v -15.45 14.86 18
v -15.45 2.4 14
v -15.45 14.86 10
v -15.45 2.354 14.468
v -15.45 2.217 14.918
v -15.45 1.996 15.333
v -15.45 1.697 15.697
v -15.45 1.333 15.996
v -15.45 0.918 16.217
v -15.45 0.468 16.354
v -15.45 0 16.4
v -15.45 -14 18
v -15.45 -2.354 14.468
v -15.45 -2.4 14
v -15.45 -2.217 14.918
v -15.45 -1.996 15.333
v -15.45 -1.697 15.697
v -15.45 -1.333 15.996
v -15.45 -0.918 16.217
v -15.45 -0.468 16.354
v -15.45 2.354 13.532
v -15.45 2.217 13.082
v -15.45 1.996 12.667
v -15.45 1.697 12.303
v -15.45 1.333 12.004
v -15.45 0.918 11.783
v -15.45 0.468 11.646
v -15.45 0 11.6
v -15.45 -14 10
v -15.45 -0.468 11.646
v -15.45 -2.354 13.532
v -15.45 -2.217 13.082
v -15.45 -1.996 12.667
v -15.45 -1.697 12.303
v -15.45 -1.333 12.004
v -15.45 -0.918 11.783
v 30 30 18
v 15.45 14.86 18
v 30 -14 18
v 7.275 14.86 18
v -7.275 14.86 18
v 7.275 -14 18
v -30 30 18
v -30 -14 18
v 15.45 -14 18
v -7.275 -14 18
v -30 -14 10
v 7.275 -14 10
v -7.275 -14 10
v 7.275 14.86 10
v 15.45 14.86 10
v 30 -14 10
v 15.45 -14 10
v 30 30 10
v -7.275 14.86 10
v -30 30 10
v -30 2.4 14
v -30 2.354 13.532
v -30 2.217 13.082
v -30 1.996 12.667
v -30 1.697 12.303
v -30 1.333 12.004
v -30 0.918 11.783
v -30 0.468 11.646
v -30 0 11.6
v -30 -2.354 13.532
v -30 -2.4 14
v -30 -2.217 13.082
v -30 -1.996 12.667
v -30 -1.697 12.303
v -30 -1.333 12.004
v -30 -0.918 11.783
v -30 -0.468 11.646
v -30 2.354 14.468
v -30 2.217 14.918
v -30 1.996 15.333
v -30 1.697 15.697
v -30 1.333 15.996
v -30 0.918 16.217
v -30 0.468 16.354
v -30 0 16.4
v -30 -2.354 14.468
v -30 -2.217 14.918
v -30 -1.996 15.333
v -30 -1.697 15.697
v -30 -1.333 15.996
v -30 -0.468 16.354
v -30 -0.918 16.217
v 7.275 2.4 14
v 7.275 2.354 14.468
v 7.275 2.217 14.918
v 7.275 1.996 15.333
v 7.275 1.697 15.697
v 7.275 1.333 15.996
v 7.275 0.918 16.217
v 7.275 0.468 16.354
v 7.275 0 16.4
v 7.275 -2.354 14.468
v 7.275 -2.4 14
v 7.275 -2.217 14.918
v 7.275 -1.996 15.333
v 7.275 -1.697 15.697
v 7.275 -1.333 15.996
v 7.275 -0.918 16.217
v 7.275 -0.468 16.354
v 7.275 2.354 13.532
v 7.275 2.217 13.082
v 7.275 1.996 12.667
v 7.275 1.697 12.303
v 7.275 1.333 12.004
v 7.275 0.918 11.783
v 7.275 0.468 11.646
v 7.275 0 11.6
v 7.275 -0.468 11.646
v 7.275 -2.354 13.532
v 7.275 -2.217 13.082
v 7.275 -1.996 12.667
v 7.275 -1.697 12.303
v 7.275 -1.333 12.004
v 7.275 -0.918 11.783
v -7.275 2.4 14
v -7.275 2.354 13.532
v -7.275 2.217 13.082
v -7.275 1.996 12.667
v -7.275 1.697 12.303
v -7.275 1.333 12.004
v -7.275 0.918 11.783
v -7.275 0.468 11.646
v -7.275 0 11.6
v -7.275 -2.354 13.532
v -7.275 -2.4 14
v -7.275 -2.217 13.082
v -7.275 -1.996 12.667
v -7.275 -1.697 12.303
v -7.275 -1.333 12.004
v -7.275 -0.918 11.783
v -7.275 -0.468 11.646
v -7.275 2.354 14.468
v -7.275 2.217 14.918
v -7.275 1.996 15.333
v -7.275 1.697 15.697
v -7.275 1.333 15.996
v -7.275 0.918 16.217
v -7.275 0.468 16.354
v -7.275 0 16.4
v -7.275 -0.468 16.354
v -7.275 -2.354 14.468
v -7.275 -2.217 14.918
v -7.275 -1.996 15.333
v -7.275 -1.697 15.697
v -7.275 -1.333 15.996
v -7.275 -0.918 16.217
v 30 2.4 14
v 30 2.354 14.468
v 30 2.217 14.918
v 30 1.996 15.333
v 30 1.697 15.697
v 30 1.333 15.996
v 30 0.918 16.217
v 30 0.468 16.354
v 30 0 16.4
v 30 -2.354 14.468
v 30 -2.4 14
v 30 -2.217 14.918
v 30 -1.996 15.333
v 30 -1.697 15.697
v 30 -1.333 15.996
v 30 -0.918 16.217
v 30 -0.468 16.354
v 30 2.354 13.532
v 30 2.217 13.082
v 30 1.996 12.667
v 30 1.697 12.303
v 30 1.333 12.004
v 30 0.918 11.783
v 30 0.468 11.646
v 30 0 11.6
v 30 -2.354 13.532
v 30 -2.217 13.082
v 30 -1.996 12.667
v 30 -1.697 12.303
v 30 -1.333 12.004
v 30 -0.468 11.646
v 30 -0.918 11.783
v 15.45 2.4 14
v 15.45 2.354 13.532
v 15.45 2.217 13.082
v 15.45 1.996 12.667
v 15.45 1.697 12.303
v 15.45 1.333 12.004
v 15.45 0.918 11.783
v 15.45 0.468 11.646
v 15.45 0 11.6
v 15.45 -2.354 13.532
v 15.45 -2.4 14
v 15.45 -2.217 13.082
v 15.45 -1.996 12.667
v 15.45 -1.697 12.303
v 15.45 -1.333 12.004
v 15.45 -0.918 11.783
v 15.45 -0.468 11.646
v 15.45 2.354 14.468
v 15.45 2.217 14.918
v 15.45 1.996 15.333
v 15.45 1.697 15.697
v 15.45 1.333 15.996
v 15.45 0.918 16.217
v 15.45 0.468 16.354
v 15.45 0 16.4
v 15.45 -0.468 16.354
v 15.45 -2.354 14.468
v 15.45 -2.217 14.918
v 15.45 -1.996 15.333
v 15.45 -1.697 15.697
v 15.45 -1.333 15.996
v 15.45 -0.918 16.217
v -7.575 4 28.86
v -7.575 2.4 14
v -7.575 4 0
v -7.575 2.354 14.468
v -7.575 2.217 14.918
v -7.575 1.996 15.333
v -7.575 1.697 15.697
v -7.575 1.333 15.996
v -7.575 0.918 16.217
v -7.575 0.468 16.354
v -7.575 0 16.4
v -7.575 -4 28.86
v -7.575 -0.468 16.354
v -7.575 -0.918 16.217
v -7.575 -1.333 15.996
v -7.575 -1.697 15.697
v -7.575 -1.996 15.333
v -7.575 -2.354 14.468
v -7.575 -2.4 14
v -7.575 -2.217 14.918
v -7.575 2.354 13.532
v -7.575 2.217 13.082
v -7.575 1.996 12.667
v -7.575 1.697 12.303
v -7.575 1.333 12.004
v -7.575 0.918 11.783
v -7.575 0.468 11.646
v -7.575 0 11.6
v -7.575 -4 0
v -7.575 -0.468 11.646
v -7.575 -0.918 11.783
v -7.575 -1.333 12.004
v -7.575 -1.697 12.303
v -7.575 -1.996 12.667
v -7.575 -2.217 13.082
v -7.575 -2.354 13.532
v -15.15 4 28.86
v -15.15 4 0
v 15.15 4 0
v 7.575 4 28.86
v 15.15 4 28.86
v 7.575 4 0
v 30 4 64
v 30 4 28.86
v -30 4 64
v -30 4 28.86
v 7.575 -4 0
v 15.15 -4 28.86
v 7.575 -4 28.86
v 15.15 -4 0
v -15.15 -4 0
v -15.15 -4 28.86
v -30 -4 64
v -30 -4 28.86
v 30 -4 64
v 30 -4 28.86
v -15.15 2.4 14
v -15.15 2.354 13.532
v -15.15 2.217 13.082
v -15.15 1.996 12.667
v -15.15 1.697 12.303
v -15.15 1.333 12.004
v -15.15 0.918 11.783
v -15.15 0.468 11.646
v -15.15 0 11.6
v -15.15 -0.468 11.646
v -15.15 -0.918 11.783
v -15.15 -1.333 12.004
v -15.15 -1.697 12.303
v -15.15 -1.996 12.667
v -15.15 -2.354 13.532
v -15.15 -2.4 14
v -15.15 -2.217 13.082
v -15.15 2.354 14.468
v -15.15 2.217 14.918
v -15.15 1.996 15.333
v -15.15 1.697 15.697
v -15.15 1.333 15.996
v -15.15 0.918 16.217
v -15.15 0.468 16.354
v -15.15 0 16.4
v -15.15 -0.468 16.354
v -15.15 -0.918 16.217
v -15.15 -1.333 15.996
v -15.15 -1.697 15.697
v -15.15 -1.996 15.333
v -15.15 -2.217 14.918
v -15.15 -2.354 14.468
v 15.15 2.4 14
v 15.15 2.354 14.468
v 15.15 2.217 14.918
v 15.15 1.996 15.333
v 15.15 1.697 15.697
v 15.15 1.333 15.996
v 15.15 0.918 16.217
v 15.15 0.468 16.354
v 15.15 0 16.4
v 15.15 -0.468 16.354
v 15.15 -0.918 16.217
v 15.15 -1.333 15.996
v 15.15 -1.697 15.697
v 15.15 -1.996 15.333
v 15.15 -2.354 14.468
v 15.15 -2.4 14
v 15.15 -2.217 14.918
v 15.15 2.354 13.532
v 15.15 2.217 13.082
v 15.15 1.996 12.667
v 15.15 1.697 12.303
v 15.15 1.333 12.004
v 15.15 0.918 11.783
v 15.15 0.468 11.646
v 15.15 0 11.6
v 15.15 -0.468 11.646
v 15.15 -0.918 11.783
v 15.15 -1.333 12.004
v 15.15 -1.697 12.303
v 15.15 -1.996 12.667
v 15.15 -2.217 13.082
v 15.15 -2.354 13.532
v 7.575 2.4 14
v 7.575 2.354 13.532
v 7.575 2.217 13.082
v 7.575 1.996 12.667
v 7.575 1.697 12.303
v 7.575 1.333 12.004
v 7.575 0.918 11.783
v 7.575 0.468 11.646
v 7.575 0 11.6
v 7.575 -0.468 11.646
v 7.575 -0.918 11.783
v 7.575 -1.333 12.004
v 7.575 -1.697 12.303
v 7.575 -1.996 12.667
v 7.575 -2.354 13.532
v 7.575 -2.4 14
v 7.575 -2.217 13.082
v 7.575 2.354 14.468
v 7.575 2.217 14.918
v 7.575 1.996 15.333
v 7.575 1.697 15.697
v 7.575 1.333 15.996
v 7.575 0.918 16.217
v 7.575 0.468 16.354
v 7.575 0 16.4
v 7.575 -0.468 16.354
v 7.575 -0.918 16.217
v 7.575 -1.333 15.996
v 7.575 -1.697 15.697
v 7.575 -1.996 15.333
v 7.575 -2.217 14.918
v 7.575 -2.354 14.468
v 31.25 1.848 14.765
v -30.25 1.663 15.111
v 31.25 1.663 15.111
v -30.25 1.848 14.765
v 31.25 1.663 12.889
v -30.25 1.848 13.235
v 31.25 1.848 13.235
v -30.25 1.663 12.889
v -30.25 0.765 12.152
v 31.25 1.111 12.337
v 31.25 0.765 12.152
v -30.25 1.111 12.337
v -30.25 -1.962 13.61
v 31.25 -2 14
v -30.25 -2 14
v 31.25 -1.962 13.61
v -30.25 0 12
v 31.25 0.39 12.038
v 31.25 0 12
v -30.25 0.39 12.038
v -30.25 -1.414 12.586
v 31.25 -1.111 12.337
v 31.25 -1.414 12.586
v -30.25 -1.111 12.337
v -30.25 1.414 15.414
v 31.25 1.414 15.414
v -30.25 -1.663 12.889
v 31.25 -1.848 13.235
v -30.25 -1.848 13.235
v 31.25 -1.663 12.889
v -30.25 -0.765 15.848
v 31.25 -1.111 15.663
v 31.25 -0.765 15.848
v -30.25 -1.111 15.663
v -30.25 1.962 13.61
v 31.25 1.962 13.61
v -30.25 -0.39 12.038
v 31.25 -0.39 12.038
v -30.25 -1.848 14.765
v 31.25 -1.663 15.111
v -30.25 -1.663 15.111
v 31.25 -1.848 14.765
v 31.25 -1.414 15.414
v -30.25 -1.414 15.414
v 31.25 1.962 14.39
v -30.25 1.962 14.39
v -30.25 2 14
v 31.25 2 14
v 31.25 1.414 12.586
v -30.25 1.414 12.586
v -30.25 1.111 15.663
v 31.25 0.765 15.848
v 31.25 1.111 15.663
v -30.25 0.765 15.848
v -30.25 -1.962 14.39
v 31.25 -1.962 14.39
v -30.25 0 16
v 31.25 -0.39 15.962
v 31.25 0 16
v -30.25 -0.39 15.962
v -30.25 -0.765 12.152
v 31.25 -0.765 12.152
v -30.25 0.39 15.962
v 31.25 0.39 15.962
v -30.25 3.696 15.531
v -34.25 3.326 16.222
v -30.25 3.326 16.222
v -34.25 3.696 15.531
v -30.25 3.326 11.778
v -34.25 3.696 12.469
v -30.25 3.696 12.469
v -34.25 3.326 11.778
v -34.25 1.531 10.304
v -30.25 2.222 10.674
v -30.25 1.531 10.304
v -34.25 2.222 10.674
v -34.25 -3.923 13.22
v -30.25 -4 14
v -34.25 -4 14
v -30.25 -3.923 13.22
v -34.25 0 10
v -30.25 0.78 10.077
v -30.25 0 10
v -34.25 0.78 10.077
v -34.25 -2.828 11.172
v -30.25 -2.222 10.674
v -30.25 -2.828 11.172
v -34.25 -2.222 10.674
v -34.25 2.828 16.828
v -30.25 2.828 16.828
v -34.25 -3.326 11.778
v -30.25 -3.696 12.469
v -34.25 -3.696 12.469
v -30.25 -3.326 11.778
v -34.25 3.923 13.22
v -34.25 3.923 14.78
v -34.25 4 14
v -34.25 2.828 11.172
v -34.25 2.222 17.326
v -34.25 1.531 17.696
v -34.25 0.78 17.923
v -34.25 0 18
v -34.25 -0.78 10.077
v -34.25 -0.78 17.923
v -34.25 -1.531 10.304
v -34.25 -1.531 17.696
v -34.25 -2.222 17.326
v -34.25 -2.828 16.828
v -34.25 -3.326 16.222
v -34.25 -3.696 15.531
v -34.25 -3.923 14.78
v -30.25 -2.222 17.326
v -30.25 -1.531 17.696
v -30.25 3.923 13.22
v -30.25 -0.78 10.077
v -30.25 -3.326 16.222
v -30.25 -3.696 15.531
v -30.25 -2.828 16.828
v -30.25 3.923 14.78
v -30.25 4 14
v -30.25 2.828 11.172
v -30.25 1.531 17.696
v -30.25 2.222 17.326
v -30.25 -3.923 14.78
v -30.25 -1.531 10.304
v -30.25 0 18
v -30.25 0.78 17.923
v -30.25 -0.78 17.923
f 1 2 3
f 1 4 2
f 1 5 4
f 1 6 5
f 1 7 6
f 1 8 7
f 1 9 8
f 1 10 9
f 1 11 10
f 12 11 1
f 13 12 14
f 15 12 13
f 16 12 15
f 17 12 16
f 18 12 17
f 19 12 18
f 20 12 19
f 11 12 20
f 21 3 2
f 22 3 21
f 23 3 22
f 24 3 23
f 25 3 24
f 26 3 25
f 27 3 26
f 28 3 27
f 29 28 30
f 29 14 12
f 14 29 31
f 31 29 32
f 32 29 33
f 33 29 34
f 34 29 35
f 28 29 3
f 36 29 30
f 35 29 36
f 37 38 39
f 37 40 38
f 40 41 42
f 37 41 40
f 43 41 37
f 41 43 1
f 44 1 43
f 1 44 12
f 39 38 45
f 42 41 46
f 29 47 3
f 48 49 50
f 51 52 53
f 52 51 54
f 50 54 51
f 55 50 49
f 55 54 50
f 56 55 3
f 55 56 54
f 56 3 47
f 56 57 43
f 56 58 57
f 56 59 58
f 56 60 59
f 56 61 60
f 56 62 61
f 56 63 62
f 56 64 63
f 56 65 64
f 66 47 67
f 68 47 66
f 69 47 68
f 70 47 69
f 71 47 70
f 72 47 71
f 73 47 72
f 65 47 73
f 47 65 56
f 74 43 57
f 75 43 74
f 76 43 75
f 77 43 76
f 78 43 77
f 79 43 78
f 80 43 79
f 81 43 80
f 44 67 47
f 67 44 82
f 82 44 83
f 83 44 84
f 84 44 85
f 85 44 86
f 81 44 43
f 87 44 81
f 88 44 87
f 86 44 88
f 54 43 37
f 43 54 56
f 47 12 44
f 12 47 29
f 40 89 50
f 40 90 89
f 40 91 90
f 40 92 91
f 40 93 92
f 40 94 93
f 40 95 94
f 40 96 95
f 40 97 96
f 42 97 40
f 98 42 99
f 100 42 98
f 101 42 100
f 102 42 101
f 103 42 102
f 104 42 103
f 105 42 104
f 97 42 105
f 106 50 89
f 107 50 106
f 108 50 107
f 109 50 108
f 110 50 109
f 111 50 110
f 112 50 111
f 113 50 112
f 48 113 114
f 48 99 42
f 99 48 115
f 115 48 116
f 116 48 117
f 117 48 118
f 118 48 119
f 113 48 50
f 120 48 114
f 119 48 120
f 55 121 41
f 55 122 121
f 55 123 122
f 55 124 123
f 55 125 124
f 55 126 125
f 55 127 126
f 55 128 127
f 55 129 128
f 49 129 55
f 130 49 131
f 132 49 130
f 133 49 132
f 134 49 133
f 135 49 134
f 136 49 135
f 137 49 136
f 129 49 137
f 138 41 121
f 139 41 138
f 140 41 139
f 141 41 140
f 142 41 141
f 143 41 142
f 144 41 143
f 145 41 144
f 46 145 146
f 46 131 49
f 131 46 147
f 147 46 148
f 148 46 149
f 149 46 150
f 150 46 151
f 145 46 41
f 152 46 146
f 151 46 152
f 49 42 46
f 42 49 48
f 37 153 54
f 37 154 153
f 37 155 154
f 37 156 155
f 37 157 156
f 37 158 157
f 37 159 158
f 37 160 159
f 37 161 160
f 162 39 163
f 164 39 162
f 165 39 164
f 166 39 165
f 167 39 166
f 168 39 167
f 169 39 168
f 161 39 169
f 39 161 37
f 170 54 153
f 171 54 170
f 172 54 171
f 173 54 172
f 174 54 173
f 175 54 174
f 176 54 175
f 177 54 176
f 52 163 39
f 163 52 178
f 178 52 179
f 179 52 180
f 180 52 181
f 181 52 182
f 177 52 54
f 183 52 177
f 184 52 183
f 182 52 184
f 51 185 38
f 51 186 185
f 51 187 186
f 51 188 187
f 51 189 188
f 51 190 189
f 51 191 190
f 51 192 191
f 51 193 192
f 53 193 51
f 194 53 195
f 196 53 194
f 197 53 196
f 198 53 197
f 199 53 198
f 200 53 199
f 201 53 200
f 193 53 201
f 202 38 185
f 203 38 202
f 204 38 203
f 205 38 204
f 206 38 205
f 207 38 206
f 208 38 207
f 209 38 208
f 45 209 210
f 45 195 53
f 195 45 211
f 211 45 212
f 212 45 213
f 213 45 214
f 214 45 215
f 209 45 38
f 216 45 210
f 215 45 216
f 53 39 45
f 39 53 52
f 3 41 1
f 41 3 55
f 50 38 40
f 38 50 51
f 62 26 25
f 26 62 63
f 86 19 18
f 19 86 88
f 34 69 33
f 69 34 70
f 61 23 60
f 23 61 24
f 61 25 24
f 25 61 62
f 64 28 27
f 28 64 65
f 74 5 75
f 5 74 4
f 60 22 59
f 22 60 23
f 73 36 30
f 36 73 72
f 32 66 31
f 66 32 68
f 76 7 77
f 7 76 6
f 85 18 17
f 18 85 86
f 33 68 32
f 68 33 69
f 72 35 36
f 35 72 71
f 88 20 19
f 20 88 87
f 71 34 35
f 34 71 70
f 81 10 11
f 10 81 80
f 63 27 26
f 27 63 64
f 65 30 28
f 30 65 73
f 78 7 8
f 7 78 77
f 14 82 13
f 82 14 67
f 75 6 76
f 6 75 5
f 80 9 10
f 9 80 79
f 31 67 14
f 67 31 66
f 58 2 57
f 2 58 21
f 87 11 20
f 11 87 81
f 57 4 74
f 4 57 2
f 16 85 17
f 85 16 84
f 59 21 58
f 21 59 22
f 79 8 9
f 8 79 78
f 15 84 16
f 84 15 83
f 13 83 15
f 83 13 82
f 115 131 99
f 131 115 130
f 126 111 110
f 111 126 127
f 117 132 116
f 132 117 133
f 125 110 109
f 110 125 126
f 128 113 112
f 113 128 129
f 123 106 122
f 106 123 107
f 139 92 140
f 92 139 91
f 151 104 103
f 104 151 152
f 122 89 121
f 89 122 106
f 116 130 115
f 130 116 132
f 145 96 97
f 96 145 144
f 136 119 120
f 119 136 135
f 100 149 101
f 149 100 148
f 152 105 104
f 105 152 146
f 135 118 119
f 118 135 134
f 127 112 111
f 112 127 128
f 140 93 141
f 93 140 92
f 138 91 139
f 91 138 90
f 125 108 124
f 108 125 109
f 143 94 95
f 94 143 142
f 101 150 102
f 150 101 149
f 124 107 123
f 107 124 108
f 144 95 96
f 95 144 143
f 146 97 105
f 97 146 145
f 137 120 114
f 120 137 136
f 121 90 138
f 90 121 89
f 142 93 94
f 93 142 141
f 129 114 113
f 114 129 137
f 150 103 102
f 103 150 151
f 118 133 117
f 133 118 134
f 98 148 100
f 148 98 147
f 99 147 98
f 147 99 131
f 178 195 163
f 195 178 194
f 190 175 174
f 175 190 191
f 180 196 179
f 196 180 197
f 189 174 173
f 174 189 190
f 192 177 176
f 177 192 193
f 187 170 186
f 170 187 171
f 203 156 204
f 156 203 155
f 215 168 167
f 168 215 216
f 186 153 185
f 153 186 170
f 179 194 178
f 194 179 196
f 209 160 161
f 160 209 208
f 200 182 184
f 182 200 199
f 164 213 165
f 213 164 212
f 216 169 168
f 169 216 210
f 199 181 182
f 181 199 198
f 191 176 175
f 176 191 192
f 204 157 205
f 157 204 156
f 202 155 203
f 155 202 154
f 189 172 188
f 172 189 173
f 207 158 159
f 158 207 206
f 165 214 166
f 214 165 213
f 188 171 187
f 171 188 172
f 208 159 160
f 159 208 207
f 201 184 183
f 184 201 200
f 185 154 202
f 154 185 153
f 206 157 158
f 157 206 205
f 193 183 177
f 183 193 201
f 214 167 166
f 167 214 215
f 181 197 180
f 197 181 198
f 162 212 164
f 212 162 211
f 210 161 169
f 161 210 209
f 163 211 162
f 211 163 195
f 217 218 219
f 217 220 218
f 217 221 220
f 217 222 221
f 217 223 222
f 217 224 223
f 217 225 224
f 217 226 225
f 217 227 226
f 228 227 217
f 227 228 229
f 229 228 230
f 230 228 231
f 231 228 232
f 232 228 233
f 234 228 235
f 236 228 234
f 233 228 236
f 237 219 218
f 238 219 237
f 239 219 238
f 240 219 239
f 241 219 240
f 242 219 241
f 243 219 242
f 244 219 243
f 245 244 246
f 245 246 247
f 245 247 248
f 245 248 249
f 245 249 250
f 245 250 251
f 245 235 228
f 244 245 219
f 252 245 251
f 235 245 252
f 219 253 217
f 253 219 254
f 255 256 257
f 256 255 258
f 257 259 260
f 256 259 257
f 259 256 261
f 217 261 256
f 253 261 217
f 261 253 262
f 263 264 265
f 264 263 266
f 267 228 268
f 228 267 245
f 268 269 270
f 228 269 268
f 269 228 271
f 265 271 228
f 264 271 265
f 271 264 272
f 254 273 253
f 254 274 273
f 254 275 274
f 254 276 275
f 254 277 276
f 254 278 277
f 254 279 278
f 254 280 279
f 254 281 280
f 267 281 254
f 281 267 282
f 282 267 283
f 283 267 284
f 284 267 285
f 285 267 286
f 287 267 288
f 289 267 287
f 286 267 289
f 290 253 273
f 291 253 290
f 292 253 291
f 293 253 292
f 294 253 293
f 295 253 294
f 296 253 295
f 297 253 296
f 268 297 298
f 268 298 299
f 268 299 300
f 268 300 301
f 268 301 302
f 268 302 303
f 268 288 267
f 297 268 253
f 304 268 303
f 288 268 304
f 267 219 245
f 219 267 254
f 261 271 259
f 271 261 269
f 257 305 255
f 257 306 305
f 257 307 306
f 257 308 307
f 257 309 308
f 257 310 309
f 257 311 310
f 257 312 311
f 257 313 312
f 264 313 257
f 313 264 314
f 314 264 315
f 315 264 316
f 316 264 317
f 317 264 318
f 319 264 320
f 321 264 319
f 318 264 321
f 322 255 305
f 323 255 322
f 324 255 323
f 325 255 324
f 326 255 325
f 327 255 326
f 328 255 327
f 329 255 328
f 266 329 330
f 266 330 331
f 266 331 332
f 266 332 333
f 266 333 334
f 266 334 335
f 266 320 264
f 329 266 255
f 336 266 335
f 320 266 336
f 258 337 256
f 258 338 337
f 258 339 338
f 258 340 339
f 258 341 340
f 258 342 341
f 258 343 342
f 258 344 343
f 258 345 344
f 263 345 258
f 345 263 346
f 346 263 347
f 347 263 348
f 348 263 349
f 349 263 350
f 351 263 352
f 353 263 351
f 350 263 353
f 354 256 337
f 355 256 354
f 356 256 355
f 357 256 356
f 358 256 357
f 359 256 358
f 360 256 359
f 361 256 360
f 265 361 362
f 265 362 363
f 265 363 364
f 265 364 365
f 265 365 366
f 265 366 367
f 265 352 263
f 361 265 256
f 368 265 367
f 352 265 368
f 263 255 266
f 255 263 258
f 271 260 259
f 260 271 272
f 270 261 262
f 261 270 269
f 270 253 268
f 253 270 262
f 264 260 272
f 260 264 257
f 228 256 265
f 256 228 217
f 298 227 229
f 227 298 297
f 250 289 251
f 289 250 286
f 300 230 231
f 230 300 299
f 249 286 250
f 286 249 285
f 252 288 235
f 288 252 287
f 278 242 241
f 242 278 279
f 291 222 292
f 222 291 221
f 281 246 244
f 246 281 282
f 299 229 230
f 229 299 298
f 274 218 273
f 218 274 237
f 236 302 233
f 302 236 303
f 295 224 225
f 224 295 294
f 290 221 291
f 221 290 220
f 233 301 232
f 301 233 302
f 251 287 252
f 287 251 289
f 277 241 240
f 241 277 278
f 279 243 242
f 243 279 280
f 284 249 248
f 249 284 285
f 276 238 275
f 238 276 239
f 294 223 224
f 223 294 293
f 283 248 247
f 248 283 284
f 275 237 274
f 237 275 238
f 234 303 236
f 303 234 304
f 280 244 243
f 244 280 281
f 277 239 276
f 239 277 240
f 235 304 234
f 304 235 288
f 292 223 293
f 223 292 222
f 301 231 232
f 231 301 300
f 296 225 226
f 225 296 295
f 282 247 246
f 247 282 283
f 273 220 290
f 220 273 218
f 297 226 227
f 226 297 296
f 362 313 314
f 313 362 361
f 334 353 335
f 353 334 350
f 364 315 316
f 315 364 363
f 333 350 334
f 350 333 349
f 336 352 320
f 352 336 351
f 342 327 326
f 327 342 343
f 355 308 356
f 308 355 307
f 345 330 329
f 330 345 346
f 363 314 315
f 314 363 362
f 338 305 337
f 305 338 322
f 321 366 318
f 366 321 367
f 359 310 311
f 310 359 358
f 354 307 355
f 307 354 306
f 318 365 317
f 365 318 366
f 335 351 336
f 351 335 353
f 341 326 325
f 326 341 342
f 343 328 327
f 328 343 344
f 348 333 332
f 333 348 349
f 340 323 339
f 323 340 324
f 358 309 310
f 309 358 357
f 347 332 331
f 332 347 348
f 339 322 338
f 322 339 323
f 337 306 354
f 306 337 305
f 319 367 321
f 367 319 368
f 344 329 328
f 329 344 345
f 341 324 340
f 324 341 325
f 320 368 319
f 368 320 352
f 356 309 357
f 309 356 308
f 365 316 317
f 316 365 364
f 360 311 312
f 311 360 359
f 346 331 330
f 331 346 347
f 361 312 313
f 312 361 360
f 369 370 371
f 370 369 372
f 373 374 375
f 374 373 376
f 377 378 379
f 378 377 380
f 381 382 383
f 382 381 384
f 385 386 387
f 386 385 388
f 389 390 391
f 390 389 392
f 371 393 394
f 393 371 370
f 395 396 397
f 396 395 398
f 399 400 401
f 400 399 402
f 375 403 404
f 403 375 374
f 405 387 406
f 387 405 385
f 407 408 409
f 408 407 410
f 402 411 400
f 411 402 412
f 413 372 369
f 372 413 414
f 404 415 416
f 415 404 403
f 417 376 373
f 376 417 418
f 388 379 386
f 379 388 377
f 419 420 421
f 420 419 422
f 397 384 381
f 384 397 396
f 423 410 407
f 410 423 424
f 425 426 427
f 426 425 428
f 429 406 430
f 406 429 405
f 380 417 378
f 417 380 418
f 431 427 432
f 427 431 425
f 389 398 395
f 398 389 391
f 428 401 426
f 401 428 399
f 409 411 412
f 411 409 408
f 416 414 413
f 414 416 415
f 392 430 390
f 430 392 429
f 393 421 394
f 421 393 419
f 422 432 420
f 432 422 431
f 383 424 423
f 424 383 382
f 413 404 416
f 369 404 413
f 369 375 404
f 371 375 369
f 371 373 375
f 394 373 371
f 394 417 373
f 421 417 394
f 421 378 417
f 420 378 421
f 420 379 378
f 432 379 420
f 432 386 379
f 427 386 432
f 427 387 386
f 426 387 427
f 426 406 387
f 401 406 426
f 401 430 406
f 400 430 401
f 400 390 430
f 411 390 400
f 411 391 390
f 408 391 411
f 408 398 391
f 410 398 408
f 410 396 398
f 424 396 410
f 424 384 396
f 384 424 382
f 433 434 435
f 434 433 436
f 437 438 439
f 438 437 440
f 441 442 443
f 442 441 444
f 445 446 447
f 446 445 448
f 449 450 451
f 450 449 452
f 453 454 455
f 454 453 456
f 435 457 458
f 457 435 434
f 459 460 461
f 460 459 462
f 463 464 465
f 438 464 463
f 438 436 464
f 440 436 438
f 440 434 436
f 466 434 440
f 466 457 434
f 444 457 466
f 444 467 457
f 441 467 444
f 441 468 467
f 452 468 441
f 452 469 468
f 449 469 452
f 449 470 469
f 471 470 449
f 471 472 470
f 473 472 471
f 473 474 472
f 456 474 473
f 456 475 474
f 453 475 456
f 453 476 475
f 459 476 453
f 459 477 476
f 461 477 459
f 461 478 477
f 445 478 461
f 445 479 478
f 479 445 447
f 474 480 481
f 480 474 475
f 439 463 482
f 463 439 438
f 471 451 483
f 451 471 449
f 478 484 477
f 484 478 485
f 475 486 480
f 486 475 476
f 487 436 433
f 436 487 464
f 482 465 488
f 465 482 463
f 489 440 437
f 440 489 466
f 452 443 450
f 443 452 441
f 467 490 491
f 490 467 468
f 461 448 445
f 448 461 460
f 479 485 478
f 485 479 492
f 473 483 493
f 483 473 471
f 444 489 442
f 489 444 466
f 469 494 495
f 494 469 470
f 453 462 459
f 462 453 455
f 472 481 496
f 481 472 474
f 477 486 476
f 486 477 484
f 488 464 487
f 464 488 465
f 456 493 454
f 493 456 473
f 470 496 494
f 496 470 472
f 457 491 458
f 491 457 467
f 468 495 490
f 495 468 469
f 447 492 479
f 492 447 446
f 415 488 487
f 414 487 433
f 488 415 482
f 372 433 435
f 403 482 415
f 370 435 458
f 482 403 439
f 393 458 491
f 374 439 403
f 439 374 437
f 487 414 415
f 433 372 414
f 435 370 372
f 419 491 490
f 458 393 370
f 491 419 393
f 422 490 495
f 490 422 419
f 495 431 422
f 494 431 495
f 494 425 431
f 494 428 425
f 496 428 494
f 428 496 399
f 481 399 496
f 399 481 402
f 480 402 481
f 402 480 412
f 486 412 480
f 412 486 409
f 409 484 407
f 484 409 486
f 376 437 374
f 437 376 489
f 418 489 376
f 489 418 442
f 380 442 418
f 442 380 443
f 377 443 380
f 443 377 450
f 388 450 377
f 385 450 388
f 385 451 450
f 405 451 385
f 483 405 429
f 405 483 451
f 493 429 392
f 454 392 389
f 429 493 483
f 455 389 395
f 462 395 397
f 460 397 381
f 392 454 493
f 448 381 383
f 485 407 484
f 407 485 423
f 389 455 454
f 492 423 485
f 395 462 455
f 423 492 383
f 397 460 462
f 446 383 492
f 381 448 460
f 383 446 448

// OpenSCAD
$fn = 32;

// ------------------------------------------------------------------------
// Butt hinge: hinge 60 mm, leaf swung 270 deg
// Every part is its own module, assembly() places every instance.
// ------------------------------------------------------------------------

// --- part 1 ---
module hinge_base() {
  difference() {
    union() {
      translate([-30, -14, -4]) cube([14.55, 44, 8]);
      translate([-7.275, -14, -4]) cube([14.55, 44, 8]);
      translate([15.45, -14, -4]) cube([14.55, 44, 8]);
      translate([-30, 14.86, -4]) cube([60, 15.14, 8]);
    }
    translate([-22.725, 0, 0]) rotate([0, 90, 0]) cylinder(h = 16.55, d = 4.8, center = true);
    translate([0, 0, 0]) rotate([0, 90, 0]) cylinder(h = 16.55, d = 4.8, center = true);
    translate([22.725, 0, 0]) rotate([0, 90, 0]) cylinder(h = 16.55, d = 4.8, center = true);
  }
}

// --- part 2 ---
module hinge_mover() {
  difference() {
    union() {
      translate([-15.15, -50, -4]) cube([7.575, 64, 8]);
      translate([7.575, -50, -4]) cube([7.575, 64, 8]);
      translate([-30, -50, -4]) cube([60, 35.14, 8]);
    }
    translate([-11.362, 0, 0]) rotate([0, 90, 0]) cylinder(h = 9.575, d = 4.8, center = true);
    translate([11.362, 0, 0]) rotate([0, 90, 0]) cylinder(h = 9.575, d = 4.8, center = true);
  }
}

// --- part 3 ---
module hinge_pin() {
  rotate([0, 90, 0]) cylinder(h = 62.5, d = 4, center = true);
  translate([-34.25, 0, 0]) rotate([0, 90, 0]) cylinder(h = 4, d = 8);
}

// --- assembly ---
module assembly() {
  color([0.80, 0.24, 0.20]) translate([0, 0, 14]) rotate([0, 0, 0]) hinge_base();
  color([0.20, 0.45, 0.75]) translate([0, 0, 14]) rotate([270, 0, 0]) hinge_mover();
  color([0.25, 0.62, 0.32]) translate([0, 0, 14]) rotate([0, 0, 0]) hinge_pin();
}

assembly();
